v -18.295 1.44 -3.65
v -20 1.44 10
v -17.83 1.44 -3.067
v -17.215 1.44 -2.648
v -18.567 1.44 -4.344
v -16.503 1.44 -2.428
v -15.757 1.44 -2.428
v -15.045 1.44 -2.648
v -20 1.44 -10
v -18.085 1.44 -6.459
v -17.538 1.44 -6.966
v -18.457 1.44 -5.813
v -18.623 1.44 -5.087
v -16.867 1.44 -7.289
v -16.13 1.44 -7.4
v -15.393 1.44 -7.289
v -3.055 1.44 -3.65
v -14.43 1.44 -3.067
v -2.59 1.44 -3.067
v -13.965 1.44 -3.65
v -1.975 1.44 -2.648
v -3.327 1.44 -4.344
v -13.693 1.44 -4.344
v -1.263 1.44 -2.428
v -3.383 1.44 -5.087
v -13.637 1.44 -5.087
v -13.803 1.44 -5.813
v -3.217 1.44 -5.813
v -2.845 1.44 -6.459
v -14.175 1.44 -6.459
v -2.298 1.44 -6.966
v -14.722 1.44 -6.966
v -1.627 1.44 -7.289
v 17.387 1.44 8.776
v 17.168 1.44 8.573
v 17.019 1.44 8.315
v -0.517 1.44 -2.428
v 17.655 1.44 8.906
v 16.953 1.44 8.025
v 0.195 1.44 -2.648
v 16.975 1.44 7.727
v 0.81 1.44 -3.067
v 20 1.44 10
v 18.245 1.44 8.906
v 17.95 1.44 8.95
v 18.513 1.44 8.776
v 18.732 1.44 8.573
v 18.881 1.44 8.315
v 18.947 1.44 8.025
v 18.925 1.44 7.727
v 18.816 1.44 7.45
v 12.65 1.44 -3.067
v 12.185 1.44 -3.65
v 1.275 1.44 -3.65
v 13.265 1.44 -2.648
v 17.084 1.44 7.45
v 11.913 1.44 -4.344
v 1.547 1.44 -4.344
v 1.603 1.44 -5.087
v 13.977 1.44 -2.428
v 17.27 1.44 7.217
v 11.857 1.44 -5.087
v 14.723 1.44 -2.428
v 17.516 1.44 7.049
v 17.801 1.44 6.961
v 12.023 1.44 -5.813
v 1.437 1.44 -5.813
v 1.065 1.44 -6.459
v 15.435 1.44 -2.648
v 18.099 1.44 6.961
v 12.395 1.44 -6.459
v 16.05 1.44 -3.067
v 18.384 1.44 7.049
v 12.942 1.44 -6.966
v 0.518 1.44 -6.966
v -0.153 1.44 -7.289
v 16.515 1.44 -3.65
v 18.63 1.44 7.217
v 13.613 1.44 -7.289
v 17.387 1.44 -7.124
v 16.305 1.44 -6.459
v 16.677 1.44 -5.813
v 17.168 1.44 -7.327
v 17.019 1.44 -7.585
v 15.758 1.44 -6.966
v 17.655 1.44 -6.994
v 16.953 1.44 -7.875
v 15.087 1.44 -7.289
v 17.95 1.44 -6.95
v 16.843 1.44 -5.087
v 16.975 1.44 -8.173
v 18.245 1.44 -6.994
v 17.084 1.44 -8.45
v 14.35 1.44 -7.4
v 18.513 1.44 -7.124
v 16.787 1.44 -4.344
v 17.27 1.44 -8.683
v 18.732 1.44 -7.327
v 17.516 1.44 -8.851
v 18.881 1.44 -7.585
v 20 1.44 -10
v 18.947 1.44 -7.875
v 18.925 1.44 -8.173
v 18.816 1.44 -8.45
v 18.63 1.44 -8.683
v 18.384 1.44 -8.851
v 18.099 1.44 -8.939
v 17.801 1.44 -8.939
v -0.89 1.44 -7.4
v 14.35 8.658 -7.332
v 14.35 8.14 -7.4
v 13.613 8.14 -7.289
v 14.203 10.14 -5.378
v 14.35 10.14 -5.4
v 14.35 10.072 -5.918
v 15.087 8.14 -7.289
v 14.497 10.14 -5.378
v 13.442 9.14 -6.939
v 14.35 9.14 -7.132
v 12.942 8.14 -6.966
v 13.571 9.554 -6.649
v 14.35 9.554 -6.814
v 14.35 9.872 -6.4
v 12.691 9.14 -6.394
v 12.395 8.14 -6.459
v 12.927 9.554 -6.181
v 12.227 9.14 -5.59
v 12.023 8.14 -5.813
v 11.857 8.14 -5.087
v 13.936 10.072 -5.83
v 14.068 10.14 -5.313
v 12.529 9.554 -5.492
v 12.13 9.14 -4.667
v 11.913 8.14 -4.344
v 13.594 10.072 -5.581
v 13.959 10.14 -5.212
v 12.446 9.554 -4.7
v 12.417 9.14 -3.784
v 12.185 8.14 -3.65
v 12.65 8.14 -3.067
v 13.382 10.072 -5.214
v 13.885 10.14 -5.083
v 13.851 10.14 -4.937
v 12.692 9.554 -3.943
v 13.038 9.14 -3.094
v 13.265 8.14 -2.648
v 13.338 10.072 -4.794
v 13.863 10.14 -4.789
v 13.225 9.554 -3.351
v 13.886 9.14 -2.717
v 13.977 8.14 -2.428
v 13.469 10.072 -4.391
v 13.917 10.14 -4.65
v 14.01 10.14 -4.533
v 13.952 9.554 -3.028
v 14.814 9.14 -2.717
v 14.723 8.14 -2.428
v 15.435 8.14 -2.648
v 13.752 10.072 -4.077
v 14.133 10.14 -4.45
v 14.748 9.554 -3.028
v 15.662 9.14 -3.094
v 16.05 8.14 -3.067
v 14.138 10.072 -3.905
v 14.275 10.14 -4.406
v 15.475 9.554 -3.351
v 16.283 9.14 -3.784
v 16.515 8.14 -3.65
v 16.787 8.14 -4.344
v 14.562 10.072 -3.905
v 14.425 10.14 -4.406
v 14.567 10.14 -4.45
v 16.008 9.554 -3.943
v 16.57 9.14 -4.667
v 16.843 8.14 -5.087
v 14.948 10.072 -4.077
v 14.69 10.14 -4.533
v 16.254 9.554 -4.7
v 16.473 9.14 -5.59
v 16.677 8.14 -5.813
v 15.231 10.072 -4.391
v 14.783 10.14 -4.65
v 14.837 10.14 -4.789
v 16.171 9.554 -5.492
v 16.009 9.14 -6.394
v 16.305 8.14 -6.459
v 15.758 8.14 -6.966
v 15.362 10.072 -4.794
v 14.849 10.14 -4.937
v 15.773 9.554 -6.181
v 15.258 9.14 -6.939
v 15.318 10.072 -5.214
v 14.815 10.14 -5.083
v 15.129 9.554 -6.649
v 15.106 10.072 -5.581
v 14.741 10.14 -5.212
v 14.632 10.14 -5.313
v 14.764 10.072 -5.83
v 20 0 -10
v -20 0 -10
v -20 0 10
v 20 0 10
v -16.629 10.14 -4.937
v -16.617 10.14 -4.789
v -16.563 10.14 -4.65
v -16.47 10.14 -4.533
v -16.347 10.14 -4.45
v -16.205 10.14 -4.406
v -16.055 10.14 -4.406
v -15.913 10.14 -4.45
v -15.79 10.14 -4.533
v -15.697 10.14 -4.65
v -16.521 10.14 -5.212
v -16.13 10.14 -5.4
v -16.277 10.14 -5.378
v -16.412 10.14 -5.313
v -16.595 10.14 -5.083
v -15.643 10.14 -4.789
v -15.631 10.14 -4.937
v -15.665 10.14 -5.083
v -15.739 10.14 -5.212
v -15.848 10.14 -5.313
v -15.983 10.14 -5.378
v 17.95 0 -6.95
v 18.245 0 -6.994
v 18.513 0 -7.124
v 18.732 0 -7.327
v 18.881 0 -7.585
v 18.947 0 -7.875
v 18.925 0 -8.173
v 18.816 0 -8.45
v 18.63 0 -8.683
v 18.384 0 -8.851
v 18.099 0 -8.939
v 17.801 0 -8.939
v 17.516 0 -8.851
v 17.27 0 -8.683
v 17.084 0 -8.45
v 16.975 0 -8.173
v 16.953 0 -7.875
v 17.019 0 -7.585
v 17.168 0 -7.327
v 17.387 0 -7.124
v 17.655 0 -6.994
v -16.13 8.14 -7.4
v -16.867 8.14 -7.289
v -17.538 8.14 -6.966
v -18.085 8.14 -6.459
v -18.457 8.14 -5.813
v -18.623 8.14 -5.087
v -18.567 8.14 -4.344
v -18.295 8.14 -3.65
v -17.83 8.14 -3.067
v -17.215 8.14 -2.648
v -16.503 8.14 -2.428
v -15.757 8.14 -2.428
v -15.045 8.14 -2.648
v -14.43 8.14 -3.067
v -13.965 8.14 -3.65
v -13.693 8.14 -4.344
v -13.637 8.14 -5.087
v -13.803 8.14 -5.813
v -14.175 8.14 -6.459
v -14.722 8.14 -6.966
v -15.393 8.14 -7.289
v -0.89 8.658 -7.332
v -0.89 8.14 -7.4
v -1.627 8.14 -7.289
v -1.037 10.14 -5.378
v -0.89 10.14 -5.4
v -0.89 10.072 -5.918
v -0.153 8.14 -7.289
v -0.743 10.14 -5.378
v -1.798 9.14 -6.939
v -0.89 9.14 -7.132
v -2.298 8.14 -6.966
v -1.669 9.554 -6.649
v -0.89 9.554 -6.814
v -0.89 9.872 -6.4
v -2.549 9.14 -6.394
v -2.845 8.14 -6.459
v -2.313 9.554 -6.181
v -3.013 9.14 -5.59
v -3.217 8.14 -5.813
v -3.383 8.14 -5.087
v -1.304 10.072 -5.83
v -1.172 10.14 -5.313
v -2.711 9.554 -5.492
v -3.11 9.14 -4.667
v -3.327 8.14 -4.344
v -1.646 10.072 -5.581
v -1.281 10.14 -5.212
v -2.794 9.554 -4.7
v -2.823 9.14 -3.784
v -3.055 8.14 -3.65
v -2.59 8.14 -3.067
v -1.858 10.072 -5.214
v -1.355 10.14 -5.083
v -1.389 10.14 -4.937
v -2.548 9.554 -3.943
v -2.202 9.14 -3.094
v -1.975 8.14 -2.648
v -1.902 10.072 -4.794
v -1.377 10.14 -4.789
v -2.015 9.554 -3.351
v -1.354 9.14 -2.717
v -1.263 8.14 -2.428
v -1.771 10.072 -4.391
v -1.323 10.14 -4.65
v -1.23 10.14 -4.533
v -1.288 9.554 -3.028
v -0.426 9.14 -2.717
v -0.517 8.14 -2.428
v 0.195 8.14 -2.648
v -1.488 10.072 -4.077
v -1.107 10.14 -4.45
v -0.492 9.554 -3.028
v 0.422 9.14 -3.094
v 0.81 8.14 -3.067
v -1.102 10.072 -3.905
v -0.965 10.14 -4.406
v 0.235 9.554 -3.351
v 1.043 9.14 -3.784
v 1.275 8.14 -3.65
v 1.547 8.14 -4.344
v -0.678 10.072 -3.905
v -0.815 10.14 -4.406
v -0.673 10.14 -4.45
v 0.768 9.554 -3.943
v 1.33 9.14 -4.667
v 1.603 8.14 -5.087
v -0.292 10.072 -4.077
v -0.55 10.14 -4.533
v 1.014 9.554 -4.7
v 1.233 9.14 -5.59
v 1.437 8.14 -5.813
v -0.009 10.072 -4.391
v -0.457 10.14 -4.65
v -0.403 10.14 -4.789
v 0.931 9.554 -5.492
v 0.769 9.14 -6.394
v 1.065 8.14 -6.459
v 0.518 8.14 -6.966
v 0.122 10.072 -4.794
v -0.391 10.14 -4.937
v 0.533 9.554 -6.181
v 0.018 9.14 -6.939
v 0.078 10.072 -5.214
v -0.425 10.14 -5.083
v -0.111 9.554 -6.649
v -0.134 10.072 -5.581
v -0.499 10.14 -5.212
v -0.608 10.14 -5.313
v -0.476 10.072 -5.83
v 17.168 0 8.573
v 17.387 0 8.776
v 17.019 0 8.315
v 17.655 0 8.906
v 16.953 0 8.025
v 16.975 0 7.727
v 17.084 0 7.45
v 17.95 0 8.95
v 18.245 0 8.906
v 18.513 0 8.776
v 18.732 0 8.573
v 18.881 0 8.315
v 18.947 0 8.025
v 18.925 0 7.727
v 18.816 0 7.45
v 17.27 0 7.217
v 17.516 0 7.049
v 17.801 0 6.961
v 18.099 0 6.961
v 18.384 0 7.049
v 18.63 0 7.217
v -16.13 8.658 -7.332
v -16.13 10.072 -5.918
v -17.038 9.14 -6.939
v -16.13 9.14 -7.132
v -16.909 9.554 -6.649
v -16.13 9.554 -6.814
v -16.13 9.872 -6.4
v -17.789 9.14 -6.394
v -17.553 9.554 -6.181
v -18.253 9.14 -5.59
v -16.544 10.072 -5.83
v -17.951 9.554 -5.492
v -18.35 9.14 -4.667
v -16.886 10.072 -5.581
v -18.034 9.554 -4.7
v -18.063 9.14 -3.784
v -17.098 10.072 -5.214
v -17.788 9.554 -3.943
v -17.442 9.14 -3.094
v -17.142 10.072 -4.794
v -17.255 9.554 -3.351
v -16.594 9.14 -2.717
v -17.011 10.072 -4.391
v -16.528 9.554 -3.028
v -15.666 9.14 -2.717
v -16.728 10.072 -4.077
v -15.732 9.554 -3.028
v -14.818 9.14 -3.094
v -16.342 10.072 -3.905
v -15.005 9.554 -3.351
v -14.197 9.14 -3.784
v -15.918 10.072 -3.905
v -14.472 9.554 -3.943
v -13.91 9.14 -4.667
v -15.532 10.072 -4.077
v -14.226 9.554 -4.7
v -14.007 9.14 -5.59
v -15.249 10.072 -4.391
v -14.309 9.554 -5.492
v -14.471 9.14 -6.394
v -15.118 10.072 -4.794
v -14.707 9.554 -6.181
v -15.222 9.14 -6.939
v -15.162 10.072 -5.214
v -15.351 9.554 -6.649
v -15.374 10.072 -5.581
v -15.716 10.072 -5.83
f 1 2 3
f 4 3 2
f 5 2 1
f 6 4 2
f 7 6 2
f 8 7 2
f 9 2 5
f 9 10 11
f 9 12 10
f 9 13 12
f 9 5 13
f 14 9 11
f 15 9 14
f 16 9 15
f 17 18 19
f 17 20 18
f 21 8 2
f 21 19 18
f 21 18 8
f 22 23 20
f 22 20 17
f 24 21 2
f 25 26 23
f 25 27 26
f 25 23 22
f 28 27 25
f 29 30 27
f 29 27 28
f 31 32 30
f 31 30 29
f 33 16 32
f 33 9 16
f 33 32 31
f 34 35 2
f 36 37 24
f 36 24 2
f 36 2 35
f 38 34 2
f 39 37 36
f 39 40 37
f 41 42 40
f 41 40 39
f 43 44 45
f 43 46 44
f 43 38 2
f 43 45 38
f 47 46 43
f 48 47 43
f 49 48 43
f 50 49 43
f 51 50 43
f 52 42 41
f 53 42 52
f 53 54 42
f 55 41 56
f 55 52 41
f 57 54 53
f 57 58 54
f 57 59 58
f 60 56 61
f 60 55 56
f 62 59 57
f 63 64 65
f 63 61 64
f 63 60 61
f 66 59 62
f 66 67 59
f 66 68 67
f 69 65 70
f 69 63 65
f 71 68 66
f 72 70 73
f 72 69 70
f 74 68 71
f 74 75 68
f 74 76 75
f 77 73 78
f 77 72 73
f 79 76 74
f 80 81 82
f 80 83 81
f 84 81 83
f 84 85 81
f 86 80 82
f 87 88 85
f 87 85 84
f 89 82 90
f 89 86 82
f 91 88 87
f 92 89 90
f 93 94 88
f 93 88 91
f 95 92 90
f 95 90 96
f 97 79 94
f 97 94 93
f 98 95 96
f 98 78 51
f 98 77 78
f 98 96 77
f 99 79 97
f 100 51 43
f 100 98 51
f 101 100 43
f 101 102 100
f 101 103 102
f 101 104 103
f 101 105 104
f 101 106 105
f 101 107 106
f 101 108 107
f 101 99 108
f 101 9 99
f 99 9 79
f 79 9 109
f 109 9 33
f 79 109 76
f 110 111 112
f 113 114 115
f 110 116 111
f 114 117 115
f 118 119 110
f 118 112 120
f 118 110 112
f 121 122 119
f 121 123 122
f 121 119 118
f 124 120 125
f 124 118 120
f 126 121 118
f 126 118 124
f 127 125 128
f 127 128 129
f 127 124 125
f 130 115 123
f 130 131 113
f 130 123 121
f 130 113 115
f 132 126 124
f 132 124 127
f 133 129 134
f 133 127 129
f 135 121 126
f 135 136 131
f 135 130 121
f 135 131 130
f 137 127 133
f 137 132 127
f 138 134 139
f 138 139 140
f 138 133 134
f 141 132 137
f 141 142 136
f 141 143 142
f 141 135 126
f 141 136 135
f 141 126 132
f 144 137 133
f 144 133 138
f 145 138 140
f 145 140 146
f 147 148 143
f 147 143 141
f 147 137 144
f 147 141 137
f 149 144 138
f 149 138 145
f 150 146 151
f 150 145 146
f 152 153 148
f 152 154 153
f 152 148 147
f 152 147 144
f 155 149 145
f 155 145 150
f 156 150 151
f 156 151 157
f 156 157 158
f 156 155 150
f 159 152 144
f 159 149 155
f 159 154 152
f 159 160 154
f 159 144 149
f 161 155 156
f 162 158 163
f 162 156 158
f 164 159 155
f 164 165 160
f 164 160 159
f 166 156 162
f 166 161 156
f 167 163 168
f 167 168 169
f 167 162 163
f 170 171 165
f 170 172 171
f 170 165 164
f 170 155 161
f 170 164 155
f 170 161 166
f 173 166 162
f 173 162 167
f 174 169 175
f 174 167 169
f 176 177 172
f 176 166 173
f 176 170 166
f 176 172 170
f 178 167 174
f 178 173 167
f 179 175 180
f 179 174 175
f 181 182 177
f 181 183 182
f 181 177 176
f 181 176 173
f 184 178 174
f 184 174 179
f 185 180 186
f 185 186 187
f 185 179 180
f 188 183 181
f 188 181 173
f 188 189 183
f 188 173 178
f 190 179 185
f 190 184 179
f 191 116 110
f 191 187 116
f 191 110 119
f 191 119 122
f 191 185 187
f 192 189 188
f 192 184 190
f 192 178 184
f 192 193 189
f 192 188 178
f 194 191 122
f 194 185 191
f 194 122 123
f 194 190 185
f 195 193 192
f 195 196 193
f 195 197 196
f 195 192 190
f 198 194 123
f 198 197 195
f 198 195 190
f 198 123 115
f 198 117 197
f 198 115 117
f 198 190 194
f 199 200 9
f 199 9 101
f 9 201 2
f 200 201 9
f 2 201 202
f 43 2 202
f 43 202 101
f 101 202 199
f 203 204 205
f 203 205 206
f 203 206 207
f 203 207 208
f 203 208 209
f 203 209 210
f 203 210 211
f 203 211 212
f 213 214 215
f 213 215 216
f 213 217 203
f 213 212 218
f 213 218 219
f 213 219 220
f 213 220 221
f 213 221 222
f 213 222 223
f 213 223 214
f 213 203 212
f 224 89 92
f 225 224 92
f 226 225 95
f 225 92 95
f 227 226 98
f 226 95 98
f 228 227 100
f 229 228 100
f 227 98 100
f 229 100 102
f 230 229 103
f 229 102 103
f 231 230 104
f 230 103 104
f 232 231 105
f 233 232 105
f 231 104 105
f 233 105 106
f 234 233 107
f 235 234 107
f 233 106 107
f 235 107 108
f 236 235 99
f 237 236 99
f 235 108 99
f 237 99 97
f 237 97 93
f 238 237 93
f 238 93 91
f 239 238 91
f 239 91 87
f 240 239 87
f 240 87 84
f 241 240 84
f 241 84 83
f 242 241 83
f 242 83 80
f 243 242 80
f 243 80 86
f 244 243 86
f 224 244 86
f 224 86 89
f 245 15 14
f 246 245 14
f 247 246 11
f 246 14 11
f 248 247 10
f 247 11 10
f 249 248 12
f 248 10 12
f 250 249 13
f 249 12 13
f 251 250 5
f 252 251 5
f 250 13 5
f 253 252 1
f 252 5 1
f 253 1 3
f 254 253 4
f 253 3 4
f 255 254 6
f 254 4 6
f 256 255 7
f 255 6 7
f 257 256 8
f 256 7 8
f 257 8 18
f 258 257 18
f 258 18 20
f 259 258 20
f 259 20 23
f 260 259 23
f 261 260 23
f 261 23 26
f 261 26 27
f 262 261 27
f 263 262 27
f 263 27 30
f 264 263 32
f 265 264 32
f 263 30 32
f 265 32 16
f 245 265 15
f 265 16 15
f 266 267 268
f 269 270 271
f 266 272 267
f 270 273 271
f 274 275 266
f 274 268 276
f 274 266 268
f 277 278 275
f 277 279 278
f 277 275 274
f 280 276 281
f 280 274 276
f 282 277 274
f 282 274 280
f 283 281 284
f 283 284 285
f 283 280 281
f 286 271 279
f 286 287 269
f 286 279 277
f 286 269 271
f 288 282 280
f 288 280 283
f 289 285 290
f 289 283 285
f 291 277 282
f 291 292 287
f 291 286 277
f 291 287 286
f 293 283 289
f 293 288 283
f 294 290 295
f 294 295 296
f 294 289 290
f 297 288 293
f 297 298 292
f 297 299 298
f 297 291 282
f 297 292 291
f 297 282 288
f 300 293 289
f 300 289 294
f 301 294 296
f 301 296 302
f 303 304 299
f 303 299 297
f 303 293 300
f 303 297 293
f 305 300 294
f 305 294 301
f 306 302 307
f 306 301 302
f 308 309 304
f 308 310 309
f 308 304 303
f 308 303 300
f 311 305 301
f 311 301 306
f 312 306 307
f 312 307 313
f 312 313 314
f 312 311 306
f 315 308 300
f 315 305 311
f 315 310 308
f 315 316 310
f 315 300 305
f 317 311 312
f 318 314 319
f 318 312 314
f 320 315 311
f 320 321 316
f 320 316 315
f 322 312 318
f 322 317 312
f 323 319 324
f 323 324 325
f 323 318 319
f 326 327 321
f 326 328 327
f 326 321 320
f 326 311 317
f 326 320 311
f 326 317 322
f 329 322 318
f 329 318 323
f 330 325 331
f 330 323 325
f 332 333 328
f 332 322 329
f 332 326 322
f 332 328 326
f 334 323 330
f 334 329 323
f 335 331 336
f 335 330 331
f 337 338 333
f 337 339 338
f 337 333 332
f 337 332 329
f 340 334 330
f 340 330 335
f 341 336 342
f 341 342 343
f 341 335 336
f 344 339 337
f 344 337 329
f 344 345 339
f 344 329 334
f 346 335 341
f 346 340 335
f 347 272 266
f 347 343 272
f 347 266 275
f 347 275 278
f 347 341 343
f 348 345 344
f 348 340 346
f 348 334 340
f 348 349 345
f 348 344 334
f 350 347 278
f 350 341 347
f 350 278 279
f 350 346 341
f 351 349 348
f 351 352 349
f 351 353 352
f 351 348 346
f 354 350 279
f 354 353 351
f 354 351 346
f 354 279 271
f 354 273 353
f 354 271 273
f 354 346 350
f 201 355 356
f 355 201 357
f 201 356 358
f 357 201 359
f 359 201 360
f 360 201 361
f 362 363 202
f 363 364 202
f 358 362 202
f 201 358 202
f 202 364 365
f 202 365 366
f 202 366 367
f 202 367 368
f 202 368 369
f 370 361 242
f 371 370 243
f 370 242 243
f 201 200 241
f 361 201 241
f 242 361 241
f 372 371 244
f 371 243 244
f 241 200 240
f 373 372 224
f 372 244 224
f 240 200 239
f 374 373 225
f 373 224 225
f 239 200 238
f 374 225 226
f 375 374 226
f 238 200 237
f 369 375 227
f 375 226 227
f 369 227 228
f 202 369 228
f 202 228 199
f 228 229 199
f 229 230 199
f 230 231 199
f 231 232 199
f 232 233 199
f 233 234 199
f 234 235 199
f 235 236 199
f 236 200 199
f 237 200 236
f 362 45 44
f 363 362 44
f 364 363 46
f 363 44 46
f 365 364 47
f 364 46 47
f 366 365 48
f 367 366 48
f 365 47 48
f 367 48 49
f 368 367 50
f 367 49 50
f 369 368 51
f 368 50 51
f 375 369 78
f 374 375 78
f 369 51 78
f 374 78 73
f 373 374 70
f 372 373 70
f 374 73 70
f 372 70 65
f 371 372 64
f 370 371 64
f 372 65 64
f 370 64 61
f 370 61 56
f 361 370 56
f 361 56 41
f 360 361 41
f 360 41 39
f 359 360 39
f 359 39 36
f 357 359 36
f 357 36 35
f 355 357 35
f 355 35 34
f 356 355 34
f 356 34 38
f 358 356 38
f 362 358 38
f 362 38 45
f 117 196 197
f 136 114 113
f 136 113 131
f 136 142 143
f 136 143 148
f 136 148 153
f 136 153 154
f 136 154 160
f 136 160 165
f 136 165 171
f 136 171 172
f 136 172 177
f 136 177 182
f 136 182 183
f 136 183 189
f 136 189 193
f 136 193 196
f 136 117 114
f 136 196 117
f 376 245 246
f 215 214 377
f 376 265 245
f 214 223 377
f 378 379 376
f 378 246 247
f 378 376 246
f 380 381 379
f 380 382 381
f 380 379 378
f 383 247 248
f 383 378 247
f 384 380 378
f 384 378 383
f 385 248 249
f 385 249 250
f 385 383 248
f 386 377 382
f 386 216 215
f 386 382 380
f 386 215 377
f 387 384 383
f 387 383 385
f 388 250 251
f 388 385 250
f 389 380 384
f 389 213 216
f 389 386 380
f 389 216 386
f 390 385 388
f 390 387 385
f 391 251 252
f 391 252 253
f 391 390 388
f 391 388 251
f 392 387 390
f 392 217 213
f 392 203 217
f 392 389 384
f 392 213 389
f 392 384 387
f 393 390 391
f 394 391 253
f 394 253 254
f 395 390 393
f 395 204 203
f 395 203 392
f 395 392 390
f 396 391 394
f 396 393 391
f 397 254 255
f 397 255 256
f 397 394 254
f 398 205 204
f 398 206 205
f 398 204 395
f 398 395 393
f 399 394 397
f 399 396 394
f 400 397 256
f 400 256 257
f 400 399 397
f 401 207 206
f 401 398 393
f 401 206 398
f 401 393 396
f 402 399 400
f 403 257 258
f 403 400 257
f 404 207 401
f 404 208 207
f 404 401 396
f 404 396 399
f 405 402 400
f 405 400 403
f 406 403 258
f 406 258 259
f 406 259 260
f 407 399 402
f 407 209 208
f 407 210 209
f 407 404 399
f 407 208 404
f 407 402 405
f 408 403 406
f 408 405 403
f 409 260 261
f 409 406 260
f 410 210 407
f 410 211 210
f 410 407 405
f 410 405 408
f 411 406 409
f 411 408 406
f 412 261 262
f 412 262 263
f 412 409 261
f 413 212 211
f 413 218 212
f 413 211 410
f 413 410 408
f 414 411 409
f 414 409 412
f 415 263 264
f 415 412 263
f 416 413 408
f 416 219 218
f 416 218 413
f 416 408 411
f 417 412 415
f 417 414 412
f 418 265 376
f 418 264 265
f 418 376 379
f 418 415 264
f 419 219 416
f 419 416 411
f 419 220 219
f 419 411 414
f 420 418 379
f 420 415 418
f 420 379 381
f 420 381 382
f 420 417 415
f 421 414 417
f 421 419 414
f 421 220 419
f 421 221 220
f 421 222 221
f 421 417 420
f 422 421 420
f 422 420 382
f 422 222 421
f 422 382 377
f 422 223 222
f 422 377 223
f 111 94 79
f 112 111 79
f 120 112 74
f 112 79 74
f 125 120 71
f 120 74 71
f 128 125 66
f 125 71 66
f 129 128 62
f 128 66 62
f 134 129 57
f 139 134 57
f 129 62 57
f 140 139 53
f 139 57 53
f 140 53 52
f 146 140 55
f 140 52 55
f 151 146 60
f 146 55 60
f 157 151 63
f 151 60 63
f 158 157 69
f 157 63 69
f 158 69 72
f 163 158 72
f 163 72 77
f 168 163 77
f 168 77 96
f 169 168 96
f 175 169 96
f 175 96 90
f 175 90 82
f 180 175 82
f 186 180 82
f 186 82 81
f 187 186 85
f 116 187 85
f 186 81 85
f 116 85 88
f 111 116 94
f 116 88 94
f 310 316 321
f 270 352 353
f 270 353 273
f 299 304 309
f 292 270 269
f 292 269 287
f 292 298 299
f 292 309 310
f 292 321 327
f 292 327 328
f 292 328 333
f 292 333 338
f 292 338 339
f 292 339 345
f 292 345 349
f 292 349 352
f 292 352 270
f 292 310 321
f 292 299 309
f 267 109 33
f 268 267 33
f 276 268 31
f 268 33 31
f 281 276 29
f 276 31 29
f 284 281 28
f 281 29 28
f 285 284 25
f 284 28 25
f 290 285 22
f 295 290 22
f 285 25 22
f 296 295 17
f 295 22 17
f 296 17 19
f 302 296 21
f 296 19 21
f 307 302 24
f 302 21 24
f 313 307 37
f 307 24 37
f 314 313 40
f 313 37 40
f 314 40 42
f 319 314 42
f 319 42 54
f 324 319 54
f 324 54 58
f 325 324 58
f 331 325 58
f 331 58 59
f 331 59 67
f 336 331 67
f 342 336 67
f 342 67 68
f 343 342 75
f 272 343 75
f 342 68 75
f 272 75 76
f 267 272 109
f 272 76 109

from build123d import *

# Parameters (mm, degrees)
SKETCH1_W           = 40
SKETCH1_H           = 20
BOSS_EXTRUDE1_DEPTH = 1.44
SKETCH2_R           = 2.5
BOSS_EXTRUDE2_DEPTH = 8.7
FILLET1_R           = 2
SKETCH3_R           = 1
CUT_EXTRUDE1_DEPTH  = 24.993540797


with BuildPart() as part:
    # Sketch1 → Boss-Extrude1 (new body)
    with BuildSketch(Plane(origin=(0, 0, 0), x_dir=(1, 0, 0), z_dir=(0, 1, 0))):
        Rectangle(SKETCH1_W, SKETCH1_H)
    extrude(amount=BOSS_EXTRUDE1_DEPTH)

    # Sketch2 → Boss-Extrude2 (add)
    with BuildSketch(Plane(origin=(0, 1.44, 0), x_dir=(1, 0, 0), z_dir=(0, 1, 0))):
        with Locations(Location((14.35, 4.9, 0), (0, 0, 90))):
            Circle(SKETCH2_R)
        with Locations(Location((-0.89, 4.9, 0), (0, 0, 90))):
            Circle(SKETCH2_R)
        with Locations(Location((-16.13, 4.9, 0), (0, 0, 90))):
            Circle(SKETCH2_R)
    extrude(amount=BOSS_EXTRUDE2_DEPTH)

    # Fillet1
    fillet1_edges = [part.edges().sort_by_distance(p)[0] for p in [
        (14.35, 10.14, -2.4),
        (-0.89, 10.14, -2.4),
        (-16.13, 10.14, -2.4),
    ]]
    fillet(fillet1_edges, radius=FILLET1_R)

    # Sketch3 → Cut-Extrude1 (cut, through all)
    with BuildSketch(Plane(origin=(0, 1.44, 0), x_dir=(1, 0, 0), z_dir=(0, 1, 0))):
        with Locations(Location((17.95, 7.95, 0), (0, 0, 270))):
            Circle(SKETCH3_R)
        with Locations(Location((17.95, -7.95, 0), (0, 0, 270))):
            Circle(SKETCH3_R)
    extrude(amount=-CUT_EXTRUDE1_DEPTH, mode=Mode.SUBTRACT)


solid = part.part
